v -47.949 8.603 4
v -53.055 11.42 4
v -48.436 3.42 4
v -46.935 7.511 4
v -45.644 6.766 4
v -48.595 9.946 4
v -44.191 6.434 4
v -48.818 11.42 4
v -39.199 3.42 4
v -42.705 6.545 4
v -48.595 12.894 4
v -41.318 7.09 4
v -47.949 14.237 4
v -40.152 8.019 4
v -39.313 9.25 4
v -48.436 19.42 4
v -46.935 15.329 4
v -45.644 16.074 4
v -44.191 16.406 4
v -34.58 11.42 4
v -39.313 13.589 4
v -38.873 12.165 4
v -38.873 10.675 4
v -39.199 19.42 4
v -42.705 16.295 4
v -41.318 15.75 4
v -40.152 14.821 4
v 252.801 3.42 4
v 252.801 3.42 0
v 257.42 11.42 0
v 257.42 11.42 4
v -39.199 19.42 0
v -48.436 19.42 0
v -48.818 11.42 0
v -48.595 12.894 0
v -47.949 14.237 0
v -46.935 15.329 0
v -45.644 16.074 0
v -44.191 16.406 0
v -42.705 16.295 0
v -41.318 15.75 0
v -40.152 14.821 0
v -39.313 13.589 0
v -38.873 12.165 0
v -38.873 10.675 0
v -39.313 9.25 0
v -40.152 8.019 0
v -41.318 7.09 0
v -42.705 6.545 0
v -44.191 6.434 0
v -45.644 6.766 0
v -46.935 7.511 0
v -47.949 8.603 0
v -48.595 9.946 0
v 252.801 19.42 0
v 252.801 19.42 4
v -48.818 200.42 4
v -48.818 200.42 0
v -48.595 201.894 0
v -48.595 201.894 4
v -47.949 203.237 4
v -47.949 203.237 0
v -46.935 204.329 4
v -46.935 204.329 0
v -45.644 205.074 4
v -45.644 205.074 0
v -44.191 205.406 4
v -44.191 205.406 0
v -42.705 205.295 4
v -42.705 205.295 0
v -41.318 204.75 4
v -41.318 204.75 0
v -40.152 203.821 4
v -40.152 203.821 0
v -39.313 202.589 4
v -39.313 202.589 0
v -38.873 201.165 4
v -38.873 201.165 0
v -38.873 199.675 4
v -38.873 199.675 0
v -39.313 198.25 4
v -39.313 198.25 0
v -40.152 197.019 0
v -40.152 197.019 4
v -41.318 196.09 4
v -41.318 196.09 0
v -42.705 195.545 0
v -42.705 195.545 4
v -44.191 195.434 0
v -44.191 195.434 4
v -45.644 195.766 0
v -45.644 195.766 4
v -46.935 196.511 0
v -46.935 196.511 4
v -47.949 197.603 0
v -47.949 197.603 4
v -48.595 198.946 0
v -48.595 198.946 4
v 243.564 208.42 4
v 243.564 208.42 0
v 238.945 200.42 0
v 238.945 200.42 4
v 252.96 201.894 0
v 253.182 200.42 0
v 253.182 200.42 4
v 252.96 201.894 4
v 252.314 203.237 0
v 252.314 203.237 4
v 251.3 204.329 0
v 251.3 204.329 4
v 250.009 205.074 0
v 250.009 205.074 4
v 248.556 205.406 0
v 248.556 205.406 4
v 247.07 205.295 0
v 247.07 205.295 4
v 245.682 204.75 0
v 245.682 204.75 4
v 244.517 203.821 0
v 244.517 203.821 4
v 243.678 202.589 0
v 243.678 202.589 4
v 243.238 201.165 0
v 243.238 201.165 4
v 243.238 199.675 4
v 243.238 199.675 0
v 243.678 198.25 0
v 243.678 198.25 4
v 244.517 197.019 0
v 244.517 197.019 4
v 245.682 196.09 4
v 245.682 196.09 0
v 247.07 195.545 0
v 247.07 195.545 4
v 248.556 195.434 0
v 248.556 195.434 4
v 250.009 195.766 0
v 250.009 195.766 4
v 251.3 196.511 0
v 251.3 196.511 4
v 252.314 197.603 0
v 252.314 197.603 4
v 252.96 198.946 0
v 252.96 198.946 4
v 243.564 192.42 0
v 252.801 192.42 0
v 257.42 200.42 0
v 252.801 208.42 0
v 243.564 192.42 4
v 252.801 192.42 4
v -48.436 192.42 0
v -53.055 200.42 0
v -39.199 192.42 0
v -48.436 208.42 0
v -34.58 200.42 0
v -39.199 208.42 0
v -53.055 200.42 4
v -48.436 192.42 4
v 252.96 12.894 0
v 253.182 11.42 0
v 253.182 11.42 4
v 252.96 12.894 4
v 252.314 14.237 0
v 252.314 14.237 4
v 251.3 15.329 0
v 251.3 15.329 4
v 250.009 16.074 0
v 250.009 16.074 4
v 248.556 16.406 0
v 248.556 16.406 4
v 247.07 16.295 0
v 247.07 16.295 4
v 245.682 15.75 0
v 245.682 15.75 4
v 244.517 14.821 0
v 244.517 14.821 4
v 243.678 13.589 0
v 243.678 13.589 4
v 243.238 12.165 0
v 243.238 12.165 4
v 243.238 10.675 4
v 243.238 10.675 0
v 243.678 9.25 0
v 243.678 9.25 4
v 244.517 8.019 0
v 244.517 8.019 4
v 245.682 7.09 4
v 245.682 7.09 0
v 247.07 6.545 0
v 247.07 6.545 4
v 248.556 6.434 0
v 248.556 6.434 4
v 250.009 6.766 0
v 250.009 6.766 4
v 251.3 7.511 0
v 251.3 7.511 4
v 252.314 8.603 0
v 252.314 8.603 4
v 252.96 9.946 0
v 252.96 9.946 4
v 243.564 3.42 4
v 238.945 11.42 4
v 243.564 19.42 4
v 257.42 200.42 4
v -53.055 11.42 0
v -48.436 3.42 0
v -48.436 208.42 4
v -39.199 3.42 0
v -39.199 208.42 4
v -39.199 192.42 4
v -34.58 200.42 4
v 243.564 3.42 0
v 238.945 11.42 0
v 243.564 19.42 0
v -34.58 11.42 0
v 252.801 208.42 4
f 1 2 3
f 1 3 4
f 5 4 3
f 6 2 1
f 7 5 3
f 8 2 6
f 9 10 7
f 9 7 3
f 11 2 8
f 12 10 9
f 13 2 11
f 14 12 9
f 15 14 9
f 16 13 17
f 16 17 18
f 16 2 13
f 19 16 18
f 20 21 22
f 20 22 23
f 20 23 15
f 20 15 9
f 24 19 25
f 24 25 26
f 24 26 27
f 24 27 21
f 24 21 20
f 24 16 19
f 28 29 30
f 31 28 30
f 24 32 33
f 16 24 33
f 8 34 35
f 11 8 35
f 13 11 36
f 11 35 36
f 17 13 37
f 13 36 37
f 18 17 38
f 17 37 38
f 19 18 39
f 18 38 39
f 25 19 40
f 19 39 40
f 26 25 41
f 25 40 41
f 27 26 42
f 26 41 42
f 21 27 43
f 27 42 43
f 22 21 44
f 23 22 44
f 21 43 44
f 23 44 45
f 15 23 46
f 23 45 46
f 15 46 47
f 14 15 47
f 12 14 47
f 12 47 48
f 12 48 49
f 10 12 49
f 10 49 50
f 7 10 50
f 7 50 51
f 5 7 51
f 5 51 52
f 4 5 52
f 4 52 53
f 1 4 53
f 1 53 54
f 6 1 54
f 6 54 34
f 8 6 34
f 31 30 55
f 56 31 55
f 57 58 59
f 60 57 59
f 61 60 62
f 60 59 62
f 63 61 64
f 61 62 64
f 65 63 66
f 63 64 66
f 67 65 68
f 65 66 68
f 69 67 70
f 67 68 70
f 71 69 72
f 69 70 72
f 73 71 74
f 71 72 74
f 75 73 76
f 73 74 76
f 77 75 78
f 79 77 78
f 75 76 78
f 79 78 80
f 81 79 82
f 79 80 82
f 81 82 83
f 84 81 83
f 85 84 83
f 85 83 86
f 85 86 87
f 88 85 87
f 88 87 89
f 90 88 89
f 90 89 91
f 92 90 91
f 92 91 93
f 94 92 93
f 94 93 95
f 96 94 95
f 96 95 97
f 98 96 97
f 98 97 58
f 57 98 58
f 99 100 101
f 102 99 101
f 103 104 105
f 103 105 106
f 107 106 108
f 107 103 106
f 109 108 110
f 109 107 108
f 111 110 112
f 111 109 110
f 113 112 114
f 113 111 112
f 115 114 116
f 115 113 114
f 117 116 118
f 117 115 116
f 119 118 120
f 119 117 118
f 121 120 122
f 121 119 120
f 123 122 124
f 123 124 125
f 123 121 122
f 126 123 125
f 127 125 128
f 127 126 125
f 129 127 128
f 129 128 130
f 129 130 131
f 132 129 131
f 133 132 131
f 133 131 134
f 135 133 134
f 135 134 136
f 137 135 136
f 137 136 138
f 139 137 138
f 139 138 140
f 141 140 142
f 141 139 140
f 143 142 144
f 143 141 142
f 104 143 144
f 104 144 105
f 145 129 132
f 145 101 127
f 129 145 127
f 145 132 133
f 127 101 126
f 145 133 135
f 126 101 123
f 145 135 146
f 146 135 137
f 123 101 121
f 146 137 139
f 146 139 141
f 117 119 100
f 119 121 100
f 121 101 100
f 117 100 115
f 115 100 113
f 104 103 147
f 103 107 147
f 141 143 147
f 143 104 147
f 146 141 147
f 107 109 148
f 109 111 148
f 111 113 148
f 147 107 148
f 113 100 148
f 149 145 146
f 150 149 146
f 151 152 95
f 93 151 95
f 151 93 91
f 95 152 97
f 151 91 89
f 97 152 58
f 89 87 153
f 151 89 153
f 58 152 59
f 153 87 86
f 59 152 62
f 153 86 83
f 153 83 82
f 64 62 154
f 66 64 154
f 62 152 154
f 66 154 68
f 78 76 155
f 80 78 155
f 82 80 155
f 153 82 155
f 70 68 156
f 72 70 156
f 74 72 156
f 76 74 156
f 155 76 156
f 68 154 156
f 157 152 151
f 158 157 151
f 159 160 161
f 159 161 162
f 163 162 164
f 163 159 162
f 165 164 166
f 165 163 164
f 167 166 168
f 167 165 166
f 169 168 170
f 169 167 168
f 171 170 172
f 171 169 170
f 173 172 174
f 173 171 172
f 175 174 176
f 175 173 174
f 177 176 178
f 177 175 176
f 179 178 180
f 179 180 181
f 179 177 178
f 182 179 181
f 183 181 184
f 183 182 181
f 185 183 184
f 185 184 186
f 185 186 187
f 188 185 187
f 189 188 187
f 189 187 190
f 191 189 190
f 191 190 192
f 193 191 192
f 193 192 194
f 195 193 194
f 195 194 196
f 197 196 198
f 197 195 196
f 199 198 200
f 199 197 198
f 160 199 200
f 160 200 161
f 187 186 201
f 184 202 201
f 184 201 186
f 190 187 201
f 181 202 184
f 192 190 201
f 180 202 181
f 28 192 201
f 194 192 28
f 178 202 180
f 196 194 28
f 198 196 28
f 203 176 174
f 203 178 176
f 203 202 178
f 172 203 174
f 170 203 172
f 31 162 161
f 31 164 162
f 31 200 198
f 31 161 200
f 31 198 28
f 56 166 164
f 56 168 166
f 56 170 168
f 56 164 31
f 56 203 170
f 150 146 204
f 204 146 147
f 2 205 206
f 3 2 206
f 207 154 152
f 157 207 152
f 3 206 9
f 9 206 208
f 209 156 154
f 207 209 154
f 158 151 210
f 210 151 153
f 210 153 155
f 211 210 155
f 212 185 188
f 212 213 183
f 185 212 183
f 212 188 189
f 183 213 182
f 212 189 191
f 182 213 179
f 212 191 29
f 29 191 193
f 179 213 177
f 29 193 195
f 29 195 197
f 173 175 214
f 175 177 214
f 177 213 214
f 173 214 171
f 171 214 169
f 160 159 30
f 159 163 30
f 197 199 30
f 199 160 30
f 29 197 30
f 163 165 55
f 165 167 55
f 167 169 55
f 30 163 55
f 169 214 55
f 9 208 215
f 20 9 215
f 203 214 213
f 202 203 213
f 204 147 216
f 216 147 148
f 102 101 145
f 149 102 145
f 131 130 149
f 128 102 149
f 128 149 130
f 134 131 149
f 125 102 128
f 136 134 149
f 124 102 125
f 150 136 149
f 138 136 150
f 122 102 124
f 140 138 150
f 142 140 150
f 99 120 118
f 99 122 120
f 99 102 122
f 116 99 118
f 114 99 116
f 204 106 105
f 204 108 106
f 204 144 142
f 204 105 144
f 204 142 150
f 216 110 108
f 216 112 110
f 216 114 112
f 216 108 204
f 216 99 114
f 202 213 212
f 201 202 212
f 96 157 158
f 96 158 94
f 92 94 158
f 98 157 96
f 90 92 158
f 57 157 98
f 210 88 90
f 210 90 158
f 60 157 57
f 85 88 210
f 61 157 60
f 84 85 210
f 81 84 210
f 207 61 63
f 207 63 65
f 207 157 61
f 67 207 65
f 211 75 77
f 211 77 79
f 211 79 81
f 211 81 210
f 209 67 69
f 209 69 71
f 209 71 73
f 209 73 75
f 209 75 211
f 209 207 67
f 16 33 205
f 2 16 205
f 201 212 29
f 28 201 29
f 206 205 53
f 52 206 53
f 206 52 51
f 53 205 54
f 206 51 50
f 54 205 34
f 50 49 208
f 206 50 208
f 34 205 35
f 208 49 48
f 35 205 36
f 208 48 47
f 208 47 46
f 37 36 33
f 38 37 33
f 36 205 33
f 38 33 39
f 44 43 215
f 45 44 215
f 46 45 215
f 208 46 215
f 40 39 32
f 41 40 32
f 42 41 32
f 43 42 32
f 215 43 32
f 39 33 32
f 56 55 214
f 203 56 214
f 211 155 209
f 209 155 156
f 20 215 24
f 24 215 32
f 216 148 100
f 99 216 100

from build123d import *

# Parameters (mm, degrees)
EXTRUDE_1_DEPTH       = 4
SKETCH_3_R            = 5
CUT_EXTRUDE_1_DEPTH   = 57.639025662
MOVE_BODY_2_OUTLINE_R = 5
MOVE_BODY_2_DEPTH     = 4


# Read off the part's stored shape, not the designer's step: 实体-移动/复制2
with BuildPart() as part:
    # 草图2 → 凸台-拉伸1 (new body)
    with BuildSketch(Plane.XY):
        Polygon((-34.579918313, 11.419905632), (-39.198720466, 19.419905632), (-48.436324773, 19.419905632), (-53.055126927, 11.419905632), (-48.436324773, 3.419905632), (-39.198720466, 3.419905632), align=None)
    extrude(amount=EXTRUDE_1_DEPTH)

    # 草图3 → 切除-拉伸1 (cut, through all)
    with BuildSketch(Plane(origin=(0, 0, 0), x_dir=(-1, 0, 0), z_dir=(0, 0, -1))):
        with Locations((43.81752262, 11.419905632)):
            Circle(SKETCH_3_R)
    extrude(amount=-CUT_EXTRUDE_1_DEPTH, mode=Mode.SUBTRACT)


with BuildPart() as body_2:
    # Move Body 1: copy of part
    add(part.part.moved(Location((0, 189, 0))))


with BuildPart() as body_3:
    # Move Body 2 outline → Move Body 2 (new body)
    # profile 1 of 2: a face of its own
    with BuildSketch(Plane.XY):
        Polygon((252.801279534, 3.419905632), (257.420081687, 11.419905632), (252.801279534, 19.419905632), (243.563675227, 19.419905632), (238.944873073, 11.419905632), (243.563675227, 3.419905632), align=None)
        with Locations((248.18247738, 11.419905632)):
            Circle(MOVE_BODY_2_OUTLINE_R, mode=Mode.SUBTRACT)
    # profile 2 of 2: a face of its own
    with BuildSketch(Plane.XY):
        Polygon((252.801279534, 192.419905632), (257.420081687, 200.419905632), (252.801279534, 208.419905632), (243.563675227, 208.419905632), (238.944873073, 200.419905632), (243.563675227, 192.419905632), align=None)
        with Locations((248.18247738, 200.419905632)):
            Circle(MOVE_BODY_2_OUTLINE_R, mode=Mode.SUBTRACT)
    extrude(amount=MOVE_BODY_2_DEPTH)


solid = Compound([part.part, body_2.part, body_3.part])
